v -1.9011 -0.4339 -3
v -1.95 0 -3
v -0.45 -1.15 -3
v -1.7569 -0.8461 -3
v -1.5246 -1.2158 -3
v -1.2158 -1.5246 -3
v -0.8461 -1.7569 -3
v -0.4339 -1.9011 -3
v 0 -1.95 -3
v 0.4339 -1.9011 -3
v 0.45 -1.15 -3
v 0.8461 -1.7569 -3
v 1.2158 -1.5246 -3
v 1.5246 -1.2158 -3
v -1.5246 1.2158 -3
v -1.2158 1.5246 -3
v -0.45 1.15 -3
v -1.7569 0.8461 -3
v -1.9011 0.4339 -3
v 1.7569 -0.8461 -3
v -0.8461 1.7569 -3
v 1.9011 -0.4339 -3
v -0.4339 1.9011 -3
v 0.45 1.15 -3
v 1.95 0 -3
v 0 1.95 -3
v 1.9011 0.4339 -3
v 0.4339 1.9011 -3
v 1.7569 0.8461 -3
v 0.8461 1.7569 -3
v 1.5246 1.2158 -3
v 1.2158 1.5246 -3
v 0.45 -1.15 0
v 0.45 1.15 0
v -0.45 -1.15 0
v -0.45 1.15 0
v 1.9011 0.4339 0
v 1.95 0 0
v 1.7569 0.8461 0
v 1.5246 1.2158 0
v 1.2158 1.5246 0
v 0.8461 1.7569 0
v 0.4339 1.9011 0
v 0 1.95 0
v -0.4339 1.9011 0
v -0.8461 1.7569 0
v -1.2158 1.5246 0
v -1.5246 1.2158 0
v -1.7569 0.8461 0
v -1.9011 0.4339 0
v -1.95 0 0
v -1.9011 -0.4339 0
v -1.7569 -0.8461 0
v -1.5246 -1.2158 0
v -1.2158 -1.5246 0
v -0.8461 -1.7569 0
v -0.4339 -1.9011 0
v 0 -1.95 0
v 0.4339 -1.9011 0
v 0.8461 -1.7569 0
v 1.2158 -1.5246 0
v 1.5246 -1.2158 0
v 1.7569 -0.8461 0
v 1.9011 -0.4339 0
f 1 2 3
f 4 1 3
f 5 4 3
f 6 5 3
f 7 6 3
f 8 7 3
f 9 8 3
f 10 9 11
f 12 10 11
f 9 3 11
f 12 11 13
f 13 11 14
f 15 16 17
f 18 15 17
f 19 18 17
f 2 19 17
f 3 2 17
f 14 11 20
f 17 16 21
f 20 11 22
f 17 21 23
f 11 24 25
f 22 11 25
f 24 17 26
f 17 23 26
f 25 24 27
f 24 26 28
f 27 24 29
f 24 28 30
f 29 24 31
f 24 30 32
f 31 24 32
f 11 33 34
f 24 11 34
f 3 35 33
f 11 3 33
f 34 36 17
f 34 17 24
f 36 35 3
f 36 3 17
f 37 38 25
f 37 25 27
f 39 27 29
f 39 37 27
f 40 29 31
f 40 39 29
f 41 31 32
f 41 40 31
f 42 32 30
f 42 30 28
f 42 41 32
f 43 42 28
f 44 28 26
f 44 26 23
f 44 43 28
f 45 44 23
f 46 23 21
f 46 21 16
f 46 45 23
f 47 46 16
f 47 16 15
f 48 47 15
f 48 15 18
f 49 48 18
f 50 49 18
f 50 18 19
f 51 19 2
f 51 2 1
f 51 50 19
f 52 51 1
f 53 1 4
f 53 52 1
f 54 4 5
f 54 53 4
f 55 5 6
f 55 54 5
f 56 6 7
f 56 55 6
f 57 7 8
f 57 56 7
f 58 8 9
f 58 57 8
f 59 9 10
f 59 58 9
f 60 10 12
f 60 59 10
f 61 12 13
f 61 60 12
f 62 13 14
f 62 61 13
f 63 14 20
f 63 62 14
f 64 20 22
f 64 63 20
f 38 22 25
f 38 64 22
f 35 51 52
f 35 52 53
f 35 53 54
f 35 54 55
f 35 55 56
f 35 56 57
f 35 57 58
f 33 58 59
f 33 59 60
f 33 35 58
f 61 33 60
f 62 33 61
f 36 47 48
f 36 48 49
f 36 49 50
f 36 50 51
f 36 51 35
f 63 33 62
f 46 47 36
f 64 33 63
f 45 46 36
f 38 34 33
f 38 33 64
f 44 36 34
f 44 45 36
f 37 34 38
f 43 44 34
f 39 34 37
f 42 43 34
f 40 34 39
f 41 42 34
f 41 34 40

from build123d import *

# Parameters (mm, degrees)
SKETCH1_R      = 1.95
SKETCH1_W      = 0.9
SKETCH1_H      = 2.3
EXT_BODY_DEPTH = 3


with BuildPart() as part:
    # Sketch1 → ext-body (new body)
    with BuildSketch(Plane.XY):
        Circle(SKETCH1_R)
        Rectangle(SKETCH1_W, SKETCH1_H, mode=Mode.SUBTRACT)
    extrude(amount=-EXT_BODY_DEPTH)


solid = part.part
